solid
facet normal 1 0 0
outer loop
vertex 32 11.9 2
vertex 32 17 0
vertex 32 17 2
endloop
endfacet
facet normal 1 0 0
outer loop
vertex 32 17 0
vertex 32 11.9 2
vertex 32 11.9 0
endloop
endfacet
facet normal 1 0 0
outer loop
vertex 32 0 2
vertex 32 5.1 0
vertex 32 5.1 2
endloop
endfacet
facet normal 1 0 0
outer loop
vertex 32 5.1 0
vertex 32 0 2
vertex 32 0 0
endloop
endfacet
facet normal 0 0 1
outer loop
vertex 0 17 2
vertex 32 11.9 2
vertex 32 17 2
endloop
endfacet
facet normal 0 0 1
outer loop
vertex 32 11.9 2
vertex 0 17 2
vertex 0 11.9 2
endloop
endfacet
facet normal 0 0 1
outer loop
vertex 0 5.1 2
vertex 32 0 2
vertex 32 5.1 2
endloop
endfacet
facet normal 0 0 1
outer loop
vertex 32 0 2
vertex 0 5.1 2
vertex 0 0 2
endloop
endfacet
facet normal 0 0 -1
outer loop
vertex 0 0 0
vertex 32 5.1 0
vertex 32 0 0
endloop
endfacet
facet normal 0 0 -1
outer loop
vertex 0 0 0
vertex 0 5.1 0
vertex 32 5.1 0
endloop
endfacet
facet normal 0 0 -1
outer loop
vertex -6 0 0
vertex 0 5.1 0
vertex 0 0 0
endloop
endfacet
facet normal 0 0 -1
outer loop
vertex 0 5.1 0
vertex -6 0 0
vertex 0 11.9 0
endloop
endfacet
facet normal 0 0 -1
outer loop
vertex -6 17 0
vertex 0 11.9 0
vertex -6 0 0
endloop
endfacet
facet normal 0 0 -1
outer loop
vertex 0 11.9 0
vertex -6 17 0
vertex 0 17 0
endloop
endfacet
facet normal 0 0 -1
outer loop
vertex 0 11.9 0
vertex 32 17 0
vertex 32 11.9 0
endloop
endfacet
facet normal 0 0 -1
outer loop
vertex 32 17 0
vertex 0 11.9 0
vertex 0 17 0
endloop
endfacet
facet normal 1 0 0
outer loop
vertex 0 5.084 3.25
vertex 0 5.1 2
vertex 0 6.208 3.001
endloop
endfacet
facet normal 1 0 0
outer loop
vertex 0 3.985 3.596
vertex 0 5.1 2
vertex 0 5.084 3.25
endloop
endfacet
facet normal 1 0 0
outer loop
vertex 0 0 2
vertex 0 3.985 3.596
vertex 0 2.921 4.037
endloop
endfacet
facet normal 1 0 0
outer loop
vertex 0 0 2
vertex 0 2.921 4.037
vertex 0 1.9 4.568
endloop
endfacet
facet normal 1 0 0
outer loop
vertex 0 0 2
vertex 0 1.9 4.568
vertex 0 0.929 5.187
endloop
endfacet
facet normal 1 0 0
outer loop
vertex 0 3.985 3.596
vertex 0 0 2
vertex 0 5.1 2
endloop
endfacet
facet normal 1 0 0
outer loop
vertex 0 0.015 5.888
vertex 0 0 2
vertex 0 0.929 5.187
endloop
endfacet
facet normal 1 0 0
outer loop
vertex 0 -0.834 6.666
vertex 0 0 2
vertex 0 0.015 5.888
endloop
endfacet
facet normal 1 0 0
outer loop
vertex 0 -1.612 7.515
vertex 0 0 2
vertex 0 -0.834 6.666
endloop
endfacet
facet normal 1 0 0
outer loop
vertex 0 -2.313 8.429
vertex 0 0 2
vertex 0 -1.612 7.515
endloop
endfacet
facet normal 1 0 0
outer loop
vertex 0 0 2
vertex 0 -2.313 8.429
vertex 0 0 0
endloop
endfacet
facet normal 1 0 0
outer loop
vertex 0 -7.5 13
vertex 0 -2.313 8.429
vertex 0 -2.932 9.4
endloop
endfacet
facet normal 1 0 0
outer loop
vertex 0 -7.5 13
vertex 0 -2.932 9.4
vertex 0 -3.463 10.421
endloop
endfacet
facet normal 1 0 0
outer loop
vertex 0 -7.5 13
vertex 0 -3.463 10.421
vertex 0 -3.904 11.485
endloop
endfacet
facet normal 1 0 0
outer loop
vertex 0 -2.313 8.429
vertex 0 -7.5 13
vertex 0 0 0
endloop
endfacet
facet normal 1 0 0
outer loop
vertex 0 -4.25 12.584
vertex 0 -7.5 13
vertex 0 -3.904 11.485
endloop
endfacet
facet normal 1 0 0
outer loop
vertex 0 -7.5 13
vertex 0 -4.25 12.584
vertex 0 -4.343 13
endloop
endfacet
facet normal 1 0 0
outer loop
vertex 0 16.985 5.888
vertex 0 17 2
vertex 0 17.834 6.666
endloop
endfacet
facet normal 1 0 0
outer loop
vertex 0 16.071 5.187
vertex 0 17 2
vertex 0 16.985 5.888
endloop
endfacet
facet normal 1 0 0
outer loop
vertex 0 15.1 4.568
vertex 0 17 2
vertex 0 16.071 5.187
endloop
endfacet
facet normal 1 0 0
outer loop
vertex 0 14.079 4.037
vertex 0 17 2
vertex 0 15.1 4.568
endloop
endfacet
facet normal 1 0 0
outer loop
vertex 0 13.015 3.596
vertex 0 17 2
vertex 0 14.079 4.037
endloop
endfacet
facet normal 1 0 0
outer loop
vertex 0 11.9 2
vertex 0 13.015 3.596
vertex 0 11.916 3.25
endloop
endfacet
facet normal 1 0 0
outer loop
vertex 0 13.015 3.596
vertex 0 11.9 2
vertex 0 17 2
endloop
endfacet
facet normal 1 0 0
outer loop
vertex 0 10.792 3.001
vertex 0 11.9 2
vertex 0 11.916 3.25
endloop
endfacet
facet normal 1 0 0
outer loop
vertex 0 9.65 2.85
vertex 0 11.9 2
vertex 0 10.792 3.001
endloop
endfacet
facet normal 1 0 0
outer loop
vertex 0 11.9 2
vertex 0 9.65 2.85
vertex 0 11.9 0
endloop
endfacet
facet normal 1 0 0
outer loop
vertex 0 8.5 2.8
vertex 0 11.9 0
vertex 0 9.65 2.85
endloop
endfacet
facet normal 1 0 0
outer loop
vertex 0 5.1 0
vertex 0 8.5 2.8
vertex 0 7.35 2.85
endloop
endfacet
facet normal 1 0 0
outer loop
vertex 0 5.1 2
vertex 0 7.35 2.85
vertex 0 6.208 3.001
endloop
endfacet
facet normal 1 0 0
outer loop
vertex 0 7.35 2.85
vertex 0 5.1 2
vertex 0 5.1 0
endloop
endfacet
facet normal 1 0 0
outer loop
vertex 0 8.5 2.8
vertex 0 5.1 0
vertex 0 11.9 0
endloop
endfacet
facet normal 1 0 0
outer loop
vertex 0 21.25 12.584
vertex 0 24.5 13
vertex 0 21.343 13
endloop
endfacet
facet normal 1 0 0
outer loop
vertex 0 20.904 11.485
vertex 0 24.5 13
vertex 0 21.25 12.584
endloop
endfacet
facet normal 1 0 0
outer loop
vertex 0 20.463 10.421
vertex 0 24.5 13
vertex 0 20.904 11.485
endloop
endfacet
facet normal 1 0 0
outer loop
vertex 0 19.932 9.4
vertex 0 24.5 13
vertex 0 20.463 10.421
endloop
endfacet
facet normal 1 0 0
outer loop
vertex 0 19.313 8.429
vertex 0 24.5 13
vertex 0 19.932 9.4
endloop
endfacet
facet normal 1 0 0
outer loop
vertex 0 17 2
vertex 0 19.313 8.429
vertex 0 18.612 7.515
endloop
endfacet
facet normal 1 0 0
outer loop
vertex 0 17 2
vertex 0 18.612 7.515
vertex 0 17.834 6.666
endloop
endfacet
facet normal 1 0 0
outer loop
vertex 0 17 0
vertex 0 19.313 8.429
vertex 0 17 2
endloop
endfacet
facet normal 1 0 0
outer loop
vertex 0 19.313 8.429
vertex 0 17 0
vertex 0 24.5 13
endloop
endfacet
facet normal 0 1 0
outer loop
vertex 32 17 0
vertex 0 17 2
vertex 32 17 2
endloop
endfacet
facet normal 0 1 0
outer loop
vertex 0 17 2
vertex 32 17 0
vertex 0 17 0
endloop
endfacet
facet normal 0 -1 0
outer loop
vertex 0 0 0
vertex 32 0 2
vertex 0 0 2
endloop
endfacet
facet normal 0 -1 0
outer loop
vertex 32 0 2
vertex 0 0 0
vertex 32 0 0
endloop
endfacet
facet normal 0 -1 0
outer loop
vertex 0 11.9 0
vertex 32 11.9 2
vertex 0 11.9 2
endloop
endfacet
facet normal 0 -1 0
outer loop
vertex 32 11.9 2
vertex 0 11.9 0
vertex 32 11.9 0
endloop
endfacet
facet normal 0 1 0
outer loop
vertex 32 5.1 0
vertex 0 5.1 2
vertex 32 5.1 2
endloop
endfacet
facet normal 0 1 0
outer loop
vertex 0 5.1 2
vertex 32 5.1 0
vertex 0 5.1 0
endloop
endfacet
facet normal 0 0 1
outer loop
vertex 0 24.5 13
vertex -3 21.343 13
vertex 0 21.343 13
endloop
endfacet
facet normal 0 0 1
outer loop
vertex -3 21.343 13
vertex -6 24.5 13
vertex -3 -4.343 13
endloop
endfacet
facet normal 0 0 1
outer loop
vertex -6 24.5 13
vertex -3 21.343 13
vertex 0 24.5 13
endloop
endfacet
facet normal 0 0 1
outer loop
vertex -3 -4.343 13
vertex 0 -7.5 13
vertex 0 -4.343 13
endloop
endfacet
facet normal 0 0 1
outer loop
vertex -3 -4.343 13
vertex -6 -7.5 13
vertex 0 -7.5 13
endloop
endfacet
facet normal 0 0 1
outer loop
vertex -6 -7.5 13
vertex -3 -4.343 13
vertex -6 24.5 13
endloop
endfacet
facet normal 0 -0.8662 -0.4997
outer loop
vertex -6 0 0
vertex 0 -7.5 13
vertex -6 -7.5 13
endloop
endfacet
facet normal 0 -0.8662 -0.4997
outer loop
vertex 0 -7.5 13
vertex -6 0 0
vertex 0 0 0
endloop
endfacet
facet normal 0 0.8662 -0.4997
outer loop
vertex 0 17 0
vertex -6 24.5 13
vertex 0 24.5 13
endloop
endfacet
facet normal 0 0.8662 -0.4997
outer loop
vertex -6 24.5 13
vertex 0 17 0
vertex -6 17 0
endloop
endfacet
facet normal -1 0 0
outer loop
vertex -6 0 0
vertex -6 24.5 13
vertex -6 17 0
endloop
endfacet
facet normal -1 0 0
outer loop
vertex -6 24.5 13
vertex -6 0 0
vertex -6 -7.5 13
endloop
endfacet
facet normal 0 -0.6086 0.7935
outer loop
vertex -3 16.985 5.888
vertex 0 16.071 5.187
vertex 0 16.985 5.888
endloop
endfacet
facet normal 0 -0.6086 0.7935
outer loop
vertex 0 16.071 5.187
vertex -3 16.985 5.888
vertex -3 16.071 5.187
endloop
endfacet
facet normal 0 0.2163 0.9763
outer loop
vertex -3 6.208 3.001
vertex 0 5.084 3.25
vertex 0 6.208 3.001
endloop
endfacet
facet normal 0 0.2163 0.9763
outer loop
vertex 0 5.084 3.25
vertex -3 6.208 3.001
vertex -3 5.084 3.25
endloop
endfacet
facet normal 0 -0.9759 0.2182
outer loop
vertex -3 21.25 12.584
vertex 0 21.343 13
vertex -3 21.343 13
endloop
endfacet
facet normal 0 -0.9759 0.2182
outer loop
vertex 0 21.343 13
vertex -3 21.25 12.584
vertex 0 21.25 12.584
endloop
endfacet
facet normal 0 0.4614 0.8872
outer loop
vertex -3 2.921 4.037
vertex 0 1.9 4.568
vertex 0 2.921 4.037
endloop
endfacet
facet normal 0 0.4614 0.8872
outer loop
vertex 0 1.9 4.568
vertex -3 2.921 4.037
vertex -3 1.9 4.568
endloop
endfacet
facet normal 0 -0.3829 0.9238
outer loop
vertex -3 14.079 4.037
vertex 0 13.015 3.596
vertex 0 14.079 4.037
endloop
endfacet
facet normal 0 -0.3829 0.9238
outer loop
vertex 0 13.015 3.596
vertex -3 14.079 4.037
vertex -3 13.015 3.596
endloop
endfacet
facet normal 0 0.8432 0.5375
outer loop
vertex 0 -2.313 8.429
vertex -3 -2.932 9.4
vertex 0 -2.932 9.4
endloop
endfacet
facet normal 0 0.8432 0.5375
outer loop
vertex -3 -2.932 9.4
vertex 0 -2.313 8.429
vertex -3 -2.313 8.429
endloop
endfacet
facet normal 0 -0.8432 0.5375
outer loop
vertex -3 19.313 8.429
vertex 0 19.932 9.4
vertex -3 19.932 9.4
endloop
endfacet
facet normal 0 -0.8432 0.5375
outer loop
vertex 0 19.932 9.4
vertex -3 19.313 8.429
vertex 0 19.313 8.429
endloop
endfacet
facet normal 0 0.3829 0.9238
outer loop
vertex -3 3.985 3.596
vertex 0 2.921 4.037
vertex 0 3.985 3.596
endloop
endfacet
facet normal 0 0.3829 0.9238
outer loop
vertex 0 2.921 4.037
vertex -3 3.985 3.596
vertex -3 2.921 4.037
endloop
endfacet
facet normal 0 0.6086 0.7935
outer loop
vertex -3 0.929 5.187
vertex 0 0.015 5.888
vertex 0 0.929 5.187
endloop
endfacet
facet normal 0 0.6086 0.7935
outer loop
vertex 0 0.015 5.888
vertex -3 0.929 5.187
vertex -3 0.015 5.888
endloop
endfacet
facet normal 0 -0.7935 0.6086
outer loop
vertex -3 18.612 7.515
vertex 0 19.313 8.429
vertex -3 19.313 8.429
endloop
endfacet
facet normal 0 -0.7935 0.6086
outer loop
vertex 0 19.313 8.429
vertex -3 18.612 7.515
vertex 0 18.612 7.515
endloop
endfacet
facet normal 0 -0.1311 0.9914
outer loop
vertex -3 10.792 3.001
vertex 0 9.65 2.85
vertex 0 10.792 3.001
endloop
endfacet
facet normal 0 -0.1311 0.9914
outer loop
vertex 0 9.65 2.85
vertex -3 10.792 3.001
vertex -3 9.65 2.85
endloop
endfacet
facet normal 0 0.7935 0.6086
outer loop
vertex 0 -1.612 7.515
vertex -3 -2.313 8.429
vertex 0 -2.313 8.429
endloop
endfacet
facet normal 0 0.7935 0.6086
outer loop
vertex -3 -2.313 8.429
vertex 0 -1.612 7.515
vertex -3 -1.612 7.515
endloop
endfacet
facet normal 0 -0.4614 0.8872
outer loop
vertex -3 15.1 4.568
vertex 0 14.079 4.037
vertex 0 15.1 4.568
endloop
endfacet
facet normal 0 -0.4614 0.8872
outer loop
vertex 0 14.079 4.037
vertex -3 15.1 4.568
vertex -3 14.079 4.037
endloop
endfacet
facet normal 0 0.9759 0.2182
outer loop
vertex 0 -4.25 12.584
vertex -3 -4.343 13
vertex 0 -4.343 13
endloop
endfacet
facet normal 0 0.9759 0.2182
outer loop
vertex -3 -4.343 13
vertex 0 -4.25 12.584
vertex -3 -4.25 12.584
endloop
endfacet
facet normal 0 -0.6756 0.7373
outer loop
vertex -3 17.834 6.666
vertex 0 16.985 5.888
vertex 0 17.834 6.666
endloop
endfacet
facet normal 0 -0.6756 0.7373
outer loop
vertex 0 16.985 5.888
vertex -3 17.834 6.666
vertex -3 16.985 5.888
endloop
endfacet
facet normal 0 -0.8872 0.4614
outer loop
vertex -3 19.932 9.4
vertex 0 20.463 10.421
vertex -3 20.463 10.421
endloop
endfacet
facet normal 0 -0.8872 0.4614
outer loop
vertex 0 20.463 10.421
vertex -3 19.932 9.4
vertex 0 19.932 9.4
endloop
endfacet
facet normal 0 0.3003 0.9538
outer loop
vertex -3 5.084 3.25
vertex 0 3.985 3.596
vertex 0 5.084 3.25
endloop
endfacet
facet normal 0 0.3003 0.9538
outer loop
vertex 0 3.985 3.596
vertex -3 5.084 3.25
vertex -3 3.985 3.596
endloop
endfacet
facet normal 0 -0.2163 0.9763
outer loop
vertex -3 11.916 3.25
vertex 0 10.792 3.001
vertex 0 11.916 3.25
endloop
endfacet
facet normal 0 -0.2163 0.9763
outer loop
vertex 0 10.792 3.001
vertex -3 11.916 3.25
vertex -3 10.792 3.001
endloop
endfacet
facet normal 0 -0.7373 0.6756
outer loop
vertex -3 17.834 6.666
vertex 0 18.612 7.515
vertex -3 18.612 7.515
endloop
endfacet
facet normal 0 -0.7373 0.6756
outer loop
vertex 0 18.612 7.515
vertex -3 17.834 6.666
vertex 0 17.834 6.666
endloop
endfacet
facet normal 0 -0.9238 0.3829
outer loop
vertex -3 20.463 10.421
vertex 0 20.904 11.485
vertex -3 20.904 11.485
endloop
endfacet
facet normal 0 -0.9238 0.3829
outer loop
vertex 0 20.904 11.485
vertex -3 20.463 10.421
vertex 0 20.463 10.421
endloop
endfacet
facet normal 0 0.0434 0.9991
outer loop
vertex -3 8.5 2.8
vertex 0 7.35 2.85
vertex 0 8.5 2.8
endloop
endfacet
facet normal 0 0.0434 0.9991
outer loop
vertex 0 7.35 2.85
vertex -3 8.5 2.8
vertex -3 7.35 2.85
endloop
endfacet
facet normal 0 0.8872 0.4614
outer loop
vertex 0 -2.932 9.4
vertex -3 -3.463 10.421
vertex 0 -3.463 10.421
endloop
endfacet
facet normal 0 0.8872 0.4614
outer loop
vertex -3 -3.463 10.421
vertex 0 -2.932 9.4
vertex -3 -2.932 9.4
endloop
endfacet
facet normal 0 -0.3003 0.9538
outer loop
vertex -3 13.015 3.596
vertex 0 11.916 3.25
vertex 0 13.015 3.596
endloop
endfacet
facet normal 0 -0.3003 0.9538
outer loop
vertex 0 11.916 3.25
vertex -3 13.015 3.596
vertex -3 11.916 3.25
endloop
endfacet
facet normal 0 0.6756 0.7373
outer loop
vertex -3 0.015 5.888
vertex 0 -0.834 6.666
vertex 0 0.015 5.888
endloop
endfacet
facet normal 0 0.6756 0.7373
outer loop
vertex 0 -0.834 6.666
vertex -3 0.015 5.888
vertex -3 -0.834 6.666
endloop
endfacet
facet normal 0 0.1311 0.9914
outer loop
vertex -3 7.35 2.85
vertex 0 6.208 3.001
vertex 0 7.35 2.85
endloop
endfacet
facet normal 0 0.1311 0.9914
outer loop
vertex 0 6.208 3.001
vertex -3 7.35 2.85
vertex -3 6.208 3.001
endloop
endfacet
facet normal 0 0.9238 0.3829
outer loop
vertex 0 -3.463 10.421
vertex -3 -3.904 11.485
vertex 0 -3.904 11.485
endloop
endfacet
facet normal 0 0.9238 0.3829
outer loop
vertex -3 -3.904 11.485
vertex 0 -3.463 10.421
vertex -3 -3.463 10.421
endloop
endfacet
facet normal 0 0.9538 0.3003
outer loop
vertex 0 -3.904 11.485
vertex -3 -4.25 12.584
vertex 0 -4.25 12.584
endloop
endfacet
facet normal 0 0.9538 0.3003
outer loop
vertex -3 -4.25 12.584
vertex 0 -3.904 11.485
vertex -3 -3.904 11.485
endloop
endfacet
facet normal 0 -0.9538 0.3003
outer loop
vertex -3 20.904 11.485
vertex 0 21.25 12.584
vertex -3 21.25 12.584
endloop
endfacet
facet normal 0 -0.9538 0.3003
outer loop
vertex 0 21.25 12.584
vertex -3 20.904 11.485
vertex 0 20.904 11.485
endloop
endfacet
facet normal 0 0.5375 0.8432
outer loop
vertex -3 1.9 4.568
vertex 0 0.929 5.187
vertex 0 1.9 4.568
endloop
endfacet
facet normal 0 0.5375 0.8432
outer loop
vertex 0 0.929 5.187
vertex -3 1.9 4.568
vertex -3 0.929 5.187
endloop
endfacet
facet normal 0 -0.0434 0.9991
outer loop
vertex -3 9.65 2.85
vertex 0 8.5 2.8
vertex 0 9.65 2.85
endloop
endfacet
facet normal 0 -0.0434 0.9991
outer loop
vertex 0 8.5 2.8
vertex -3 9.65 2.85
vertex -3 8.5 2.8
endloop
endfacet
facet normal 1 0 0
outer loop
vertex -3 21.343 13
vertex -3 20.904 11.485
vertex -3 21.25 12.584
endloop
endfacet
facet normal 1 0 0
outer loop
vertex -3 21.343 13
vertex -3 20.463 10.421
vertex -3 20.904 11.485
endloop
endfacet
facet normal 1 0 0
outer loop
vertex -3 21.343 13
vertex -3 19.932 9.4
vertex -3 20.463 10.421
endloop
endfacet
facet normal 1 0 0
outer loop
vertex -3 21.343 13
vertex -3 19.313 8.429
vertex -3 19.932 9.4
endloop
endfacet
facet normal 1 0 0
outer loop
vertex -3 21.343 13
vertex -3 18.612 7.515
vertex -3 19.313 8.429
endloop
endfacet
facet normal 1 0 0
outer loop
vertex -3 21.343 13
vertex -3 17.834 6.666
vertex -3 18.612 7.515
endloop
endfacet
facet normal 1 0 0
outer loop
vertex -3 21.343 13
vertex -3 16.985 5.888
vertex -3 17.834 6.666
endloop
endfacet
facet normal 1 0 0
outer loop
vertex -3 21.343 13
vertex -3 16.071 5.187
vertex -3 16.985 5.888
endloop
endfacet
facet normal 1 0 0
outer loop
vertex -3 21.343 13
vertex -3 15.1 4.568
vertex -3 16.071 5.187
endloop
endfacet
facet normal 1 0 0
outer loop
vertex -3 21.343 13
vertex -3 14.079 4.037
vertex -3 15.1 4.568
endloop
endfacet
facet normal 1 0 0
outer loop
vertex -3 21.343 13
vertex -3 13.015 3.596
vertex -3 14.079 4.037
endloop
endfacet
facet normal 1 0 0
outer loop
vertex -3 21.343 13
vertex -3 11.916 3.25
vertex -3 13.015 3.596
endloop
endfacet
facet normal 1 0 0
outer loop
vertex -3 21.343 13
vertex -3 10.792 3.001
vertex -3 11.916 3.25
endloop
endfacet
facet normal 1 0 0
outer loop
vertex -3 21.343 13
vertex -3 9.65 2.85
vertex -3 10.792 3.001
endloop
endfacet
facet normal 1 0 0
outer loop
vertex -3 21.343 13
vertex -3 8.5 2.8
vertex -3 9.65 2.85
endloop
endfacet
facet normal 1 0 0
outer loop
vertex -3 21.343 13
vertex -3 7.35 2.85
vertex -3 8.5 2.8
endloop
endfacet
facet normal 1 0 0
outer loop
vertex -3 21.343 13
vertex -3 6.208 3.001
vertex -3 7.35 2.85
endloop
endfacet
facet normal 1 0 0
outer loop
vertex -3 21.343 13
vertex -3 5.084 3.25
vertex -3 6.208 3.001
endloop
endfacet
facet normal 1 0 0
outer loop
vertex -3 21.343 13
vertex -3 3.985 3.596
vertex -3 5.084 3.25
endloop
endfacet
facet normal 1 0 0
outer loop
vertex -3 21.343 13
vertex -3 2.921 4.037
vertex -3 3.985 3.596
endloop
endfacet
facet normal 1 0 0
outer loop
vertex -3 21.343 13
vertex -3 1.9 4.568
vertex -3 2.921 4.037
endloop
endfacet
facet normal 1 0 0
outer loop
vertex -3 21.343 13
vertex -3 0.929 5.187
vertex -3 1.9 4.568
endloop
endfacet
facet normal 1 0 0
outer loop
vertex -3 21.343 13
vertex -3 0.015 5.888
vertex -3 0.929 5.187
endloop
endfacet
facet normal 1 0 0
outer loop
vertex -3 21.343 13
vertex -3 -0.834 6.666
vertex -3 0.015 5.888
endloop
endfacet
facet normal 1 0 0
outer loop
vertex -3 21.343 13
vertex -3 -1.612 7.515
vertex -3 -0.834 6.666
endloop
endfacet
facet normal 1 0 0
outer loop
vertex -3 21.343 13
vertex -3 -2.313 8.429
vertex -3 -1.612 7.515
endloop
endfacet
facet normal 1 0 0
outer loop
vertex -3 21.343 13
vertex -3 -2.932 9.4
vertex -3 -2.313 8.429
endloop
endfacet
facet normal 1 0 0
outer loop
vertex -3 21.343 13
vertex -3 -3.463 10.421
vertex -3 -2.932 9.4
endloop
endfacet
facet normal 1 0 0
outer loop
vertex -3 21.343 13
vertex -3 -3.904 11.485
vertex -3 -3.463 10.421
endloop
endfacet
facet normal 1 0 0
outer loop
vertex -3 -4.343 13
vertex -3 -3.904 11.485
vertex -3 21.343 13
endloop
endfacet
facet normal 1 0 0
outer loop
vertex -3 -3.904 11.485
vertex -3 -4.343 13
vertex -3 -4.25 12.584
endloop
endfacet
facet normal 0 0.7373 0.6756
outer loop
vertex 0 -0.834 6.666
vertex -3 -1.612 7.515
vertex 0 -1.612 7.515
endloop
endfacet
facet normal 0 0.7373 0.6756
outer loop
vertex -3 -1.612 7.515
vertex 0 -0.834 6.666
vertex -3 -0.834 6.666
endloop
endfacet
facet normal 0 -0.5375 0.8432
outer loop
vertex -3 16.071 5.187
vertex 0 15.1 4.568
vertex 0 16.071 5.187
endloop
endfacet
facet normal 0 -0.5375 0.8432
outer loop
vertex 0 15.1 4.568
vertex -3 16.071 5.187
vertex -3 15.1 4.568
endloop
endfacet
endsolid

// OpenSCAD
Gap = 0.2;
$fn = 72;

NutToMotorSupport();

module NutToMotorSupport() {
    Padding = 3.0;

    MotorInnerRadius = 13.0;
    MotorBraceRadius = MotorInnerRadius + Padding;

    SupportHeight = 6.0;
    MotorRadius = 26.0;

    HeadDiameter = 11.0;
    HeadHeight = 4.5 + Gap;

    ThreadDiameter = 6.6 + Gap; // I measured 6.2, but RodToBearingCoupling uses 6.5 for a snug fit
    ThreadHeight = 2.0;

    FrameAdapterWidth = HeadDiameter + 2*Padding;
    NutAdapterLength = 32;
    FrameAdapterHeight = ThreadHeight;

    MotorAdapterOffset = MotorBraceRadius; // Center of the rod
    BearingAdapterShift = 0;

    ToTheSky = 50;

    union() {
        // Frame adapter
        difference() {
            cube([NutAdapterLength, FrameAdapterWidth, ThreadHeight]);

            // Volume of the nut thread
            translate([0, Padding + (HeadDiameter - ThreadDiameter)/2, 0])
                cube([NutAdapterLength, ThreadDiameter, ThreadHeight]);
        }

        // Motor adapter
        rotate([0, -90, 0])
        translate([MotorAdapterOffset, FrameAdapterWidth/2, -BearingAdapterShift +SupportHeight/2])
        difference() {
            union()
            {
                // Connection to frame adapter
                translate([-MotorAdapterOffset/2, 0, 0])
                linear_extrude(height = SupportHeight, center = true)
                    polygon(points = [
                    [-MotorAdapterOffset/2, -FrameAdapterWidth/2],
                    [MotorAdapterOffset/2 - Padding, -MotorBraceRadius],
                    [MotorAdapterOffset/2 - Padding, MotorBraceRadius],
                    [-MotorAdapterOffset/2, FrameAdapterWidth/2],
                    ]);
            }
            union() {
                // Volume of motor
                translate([0, 0, -Padding])
                    cylinder(r = MotorInnerRadius + Gap, h=Padding*2, center=true);
            }
        }
    }
}
